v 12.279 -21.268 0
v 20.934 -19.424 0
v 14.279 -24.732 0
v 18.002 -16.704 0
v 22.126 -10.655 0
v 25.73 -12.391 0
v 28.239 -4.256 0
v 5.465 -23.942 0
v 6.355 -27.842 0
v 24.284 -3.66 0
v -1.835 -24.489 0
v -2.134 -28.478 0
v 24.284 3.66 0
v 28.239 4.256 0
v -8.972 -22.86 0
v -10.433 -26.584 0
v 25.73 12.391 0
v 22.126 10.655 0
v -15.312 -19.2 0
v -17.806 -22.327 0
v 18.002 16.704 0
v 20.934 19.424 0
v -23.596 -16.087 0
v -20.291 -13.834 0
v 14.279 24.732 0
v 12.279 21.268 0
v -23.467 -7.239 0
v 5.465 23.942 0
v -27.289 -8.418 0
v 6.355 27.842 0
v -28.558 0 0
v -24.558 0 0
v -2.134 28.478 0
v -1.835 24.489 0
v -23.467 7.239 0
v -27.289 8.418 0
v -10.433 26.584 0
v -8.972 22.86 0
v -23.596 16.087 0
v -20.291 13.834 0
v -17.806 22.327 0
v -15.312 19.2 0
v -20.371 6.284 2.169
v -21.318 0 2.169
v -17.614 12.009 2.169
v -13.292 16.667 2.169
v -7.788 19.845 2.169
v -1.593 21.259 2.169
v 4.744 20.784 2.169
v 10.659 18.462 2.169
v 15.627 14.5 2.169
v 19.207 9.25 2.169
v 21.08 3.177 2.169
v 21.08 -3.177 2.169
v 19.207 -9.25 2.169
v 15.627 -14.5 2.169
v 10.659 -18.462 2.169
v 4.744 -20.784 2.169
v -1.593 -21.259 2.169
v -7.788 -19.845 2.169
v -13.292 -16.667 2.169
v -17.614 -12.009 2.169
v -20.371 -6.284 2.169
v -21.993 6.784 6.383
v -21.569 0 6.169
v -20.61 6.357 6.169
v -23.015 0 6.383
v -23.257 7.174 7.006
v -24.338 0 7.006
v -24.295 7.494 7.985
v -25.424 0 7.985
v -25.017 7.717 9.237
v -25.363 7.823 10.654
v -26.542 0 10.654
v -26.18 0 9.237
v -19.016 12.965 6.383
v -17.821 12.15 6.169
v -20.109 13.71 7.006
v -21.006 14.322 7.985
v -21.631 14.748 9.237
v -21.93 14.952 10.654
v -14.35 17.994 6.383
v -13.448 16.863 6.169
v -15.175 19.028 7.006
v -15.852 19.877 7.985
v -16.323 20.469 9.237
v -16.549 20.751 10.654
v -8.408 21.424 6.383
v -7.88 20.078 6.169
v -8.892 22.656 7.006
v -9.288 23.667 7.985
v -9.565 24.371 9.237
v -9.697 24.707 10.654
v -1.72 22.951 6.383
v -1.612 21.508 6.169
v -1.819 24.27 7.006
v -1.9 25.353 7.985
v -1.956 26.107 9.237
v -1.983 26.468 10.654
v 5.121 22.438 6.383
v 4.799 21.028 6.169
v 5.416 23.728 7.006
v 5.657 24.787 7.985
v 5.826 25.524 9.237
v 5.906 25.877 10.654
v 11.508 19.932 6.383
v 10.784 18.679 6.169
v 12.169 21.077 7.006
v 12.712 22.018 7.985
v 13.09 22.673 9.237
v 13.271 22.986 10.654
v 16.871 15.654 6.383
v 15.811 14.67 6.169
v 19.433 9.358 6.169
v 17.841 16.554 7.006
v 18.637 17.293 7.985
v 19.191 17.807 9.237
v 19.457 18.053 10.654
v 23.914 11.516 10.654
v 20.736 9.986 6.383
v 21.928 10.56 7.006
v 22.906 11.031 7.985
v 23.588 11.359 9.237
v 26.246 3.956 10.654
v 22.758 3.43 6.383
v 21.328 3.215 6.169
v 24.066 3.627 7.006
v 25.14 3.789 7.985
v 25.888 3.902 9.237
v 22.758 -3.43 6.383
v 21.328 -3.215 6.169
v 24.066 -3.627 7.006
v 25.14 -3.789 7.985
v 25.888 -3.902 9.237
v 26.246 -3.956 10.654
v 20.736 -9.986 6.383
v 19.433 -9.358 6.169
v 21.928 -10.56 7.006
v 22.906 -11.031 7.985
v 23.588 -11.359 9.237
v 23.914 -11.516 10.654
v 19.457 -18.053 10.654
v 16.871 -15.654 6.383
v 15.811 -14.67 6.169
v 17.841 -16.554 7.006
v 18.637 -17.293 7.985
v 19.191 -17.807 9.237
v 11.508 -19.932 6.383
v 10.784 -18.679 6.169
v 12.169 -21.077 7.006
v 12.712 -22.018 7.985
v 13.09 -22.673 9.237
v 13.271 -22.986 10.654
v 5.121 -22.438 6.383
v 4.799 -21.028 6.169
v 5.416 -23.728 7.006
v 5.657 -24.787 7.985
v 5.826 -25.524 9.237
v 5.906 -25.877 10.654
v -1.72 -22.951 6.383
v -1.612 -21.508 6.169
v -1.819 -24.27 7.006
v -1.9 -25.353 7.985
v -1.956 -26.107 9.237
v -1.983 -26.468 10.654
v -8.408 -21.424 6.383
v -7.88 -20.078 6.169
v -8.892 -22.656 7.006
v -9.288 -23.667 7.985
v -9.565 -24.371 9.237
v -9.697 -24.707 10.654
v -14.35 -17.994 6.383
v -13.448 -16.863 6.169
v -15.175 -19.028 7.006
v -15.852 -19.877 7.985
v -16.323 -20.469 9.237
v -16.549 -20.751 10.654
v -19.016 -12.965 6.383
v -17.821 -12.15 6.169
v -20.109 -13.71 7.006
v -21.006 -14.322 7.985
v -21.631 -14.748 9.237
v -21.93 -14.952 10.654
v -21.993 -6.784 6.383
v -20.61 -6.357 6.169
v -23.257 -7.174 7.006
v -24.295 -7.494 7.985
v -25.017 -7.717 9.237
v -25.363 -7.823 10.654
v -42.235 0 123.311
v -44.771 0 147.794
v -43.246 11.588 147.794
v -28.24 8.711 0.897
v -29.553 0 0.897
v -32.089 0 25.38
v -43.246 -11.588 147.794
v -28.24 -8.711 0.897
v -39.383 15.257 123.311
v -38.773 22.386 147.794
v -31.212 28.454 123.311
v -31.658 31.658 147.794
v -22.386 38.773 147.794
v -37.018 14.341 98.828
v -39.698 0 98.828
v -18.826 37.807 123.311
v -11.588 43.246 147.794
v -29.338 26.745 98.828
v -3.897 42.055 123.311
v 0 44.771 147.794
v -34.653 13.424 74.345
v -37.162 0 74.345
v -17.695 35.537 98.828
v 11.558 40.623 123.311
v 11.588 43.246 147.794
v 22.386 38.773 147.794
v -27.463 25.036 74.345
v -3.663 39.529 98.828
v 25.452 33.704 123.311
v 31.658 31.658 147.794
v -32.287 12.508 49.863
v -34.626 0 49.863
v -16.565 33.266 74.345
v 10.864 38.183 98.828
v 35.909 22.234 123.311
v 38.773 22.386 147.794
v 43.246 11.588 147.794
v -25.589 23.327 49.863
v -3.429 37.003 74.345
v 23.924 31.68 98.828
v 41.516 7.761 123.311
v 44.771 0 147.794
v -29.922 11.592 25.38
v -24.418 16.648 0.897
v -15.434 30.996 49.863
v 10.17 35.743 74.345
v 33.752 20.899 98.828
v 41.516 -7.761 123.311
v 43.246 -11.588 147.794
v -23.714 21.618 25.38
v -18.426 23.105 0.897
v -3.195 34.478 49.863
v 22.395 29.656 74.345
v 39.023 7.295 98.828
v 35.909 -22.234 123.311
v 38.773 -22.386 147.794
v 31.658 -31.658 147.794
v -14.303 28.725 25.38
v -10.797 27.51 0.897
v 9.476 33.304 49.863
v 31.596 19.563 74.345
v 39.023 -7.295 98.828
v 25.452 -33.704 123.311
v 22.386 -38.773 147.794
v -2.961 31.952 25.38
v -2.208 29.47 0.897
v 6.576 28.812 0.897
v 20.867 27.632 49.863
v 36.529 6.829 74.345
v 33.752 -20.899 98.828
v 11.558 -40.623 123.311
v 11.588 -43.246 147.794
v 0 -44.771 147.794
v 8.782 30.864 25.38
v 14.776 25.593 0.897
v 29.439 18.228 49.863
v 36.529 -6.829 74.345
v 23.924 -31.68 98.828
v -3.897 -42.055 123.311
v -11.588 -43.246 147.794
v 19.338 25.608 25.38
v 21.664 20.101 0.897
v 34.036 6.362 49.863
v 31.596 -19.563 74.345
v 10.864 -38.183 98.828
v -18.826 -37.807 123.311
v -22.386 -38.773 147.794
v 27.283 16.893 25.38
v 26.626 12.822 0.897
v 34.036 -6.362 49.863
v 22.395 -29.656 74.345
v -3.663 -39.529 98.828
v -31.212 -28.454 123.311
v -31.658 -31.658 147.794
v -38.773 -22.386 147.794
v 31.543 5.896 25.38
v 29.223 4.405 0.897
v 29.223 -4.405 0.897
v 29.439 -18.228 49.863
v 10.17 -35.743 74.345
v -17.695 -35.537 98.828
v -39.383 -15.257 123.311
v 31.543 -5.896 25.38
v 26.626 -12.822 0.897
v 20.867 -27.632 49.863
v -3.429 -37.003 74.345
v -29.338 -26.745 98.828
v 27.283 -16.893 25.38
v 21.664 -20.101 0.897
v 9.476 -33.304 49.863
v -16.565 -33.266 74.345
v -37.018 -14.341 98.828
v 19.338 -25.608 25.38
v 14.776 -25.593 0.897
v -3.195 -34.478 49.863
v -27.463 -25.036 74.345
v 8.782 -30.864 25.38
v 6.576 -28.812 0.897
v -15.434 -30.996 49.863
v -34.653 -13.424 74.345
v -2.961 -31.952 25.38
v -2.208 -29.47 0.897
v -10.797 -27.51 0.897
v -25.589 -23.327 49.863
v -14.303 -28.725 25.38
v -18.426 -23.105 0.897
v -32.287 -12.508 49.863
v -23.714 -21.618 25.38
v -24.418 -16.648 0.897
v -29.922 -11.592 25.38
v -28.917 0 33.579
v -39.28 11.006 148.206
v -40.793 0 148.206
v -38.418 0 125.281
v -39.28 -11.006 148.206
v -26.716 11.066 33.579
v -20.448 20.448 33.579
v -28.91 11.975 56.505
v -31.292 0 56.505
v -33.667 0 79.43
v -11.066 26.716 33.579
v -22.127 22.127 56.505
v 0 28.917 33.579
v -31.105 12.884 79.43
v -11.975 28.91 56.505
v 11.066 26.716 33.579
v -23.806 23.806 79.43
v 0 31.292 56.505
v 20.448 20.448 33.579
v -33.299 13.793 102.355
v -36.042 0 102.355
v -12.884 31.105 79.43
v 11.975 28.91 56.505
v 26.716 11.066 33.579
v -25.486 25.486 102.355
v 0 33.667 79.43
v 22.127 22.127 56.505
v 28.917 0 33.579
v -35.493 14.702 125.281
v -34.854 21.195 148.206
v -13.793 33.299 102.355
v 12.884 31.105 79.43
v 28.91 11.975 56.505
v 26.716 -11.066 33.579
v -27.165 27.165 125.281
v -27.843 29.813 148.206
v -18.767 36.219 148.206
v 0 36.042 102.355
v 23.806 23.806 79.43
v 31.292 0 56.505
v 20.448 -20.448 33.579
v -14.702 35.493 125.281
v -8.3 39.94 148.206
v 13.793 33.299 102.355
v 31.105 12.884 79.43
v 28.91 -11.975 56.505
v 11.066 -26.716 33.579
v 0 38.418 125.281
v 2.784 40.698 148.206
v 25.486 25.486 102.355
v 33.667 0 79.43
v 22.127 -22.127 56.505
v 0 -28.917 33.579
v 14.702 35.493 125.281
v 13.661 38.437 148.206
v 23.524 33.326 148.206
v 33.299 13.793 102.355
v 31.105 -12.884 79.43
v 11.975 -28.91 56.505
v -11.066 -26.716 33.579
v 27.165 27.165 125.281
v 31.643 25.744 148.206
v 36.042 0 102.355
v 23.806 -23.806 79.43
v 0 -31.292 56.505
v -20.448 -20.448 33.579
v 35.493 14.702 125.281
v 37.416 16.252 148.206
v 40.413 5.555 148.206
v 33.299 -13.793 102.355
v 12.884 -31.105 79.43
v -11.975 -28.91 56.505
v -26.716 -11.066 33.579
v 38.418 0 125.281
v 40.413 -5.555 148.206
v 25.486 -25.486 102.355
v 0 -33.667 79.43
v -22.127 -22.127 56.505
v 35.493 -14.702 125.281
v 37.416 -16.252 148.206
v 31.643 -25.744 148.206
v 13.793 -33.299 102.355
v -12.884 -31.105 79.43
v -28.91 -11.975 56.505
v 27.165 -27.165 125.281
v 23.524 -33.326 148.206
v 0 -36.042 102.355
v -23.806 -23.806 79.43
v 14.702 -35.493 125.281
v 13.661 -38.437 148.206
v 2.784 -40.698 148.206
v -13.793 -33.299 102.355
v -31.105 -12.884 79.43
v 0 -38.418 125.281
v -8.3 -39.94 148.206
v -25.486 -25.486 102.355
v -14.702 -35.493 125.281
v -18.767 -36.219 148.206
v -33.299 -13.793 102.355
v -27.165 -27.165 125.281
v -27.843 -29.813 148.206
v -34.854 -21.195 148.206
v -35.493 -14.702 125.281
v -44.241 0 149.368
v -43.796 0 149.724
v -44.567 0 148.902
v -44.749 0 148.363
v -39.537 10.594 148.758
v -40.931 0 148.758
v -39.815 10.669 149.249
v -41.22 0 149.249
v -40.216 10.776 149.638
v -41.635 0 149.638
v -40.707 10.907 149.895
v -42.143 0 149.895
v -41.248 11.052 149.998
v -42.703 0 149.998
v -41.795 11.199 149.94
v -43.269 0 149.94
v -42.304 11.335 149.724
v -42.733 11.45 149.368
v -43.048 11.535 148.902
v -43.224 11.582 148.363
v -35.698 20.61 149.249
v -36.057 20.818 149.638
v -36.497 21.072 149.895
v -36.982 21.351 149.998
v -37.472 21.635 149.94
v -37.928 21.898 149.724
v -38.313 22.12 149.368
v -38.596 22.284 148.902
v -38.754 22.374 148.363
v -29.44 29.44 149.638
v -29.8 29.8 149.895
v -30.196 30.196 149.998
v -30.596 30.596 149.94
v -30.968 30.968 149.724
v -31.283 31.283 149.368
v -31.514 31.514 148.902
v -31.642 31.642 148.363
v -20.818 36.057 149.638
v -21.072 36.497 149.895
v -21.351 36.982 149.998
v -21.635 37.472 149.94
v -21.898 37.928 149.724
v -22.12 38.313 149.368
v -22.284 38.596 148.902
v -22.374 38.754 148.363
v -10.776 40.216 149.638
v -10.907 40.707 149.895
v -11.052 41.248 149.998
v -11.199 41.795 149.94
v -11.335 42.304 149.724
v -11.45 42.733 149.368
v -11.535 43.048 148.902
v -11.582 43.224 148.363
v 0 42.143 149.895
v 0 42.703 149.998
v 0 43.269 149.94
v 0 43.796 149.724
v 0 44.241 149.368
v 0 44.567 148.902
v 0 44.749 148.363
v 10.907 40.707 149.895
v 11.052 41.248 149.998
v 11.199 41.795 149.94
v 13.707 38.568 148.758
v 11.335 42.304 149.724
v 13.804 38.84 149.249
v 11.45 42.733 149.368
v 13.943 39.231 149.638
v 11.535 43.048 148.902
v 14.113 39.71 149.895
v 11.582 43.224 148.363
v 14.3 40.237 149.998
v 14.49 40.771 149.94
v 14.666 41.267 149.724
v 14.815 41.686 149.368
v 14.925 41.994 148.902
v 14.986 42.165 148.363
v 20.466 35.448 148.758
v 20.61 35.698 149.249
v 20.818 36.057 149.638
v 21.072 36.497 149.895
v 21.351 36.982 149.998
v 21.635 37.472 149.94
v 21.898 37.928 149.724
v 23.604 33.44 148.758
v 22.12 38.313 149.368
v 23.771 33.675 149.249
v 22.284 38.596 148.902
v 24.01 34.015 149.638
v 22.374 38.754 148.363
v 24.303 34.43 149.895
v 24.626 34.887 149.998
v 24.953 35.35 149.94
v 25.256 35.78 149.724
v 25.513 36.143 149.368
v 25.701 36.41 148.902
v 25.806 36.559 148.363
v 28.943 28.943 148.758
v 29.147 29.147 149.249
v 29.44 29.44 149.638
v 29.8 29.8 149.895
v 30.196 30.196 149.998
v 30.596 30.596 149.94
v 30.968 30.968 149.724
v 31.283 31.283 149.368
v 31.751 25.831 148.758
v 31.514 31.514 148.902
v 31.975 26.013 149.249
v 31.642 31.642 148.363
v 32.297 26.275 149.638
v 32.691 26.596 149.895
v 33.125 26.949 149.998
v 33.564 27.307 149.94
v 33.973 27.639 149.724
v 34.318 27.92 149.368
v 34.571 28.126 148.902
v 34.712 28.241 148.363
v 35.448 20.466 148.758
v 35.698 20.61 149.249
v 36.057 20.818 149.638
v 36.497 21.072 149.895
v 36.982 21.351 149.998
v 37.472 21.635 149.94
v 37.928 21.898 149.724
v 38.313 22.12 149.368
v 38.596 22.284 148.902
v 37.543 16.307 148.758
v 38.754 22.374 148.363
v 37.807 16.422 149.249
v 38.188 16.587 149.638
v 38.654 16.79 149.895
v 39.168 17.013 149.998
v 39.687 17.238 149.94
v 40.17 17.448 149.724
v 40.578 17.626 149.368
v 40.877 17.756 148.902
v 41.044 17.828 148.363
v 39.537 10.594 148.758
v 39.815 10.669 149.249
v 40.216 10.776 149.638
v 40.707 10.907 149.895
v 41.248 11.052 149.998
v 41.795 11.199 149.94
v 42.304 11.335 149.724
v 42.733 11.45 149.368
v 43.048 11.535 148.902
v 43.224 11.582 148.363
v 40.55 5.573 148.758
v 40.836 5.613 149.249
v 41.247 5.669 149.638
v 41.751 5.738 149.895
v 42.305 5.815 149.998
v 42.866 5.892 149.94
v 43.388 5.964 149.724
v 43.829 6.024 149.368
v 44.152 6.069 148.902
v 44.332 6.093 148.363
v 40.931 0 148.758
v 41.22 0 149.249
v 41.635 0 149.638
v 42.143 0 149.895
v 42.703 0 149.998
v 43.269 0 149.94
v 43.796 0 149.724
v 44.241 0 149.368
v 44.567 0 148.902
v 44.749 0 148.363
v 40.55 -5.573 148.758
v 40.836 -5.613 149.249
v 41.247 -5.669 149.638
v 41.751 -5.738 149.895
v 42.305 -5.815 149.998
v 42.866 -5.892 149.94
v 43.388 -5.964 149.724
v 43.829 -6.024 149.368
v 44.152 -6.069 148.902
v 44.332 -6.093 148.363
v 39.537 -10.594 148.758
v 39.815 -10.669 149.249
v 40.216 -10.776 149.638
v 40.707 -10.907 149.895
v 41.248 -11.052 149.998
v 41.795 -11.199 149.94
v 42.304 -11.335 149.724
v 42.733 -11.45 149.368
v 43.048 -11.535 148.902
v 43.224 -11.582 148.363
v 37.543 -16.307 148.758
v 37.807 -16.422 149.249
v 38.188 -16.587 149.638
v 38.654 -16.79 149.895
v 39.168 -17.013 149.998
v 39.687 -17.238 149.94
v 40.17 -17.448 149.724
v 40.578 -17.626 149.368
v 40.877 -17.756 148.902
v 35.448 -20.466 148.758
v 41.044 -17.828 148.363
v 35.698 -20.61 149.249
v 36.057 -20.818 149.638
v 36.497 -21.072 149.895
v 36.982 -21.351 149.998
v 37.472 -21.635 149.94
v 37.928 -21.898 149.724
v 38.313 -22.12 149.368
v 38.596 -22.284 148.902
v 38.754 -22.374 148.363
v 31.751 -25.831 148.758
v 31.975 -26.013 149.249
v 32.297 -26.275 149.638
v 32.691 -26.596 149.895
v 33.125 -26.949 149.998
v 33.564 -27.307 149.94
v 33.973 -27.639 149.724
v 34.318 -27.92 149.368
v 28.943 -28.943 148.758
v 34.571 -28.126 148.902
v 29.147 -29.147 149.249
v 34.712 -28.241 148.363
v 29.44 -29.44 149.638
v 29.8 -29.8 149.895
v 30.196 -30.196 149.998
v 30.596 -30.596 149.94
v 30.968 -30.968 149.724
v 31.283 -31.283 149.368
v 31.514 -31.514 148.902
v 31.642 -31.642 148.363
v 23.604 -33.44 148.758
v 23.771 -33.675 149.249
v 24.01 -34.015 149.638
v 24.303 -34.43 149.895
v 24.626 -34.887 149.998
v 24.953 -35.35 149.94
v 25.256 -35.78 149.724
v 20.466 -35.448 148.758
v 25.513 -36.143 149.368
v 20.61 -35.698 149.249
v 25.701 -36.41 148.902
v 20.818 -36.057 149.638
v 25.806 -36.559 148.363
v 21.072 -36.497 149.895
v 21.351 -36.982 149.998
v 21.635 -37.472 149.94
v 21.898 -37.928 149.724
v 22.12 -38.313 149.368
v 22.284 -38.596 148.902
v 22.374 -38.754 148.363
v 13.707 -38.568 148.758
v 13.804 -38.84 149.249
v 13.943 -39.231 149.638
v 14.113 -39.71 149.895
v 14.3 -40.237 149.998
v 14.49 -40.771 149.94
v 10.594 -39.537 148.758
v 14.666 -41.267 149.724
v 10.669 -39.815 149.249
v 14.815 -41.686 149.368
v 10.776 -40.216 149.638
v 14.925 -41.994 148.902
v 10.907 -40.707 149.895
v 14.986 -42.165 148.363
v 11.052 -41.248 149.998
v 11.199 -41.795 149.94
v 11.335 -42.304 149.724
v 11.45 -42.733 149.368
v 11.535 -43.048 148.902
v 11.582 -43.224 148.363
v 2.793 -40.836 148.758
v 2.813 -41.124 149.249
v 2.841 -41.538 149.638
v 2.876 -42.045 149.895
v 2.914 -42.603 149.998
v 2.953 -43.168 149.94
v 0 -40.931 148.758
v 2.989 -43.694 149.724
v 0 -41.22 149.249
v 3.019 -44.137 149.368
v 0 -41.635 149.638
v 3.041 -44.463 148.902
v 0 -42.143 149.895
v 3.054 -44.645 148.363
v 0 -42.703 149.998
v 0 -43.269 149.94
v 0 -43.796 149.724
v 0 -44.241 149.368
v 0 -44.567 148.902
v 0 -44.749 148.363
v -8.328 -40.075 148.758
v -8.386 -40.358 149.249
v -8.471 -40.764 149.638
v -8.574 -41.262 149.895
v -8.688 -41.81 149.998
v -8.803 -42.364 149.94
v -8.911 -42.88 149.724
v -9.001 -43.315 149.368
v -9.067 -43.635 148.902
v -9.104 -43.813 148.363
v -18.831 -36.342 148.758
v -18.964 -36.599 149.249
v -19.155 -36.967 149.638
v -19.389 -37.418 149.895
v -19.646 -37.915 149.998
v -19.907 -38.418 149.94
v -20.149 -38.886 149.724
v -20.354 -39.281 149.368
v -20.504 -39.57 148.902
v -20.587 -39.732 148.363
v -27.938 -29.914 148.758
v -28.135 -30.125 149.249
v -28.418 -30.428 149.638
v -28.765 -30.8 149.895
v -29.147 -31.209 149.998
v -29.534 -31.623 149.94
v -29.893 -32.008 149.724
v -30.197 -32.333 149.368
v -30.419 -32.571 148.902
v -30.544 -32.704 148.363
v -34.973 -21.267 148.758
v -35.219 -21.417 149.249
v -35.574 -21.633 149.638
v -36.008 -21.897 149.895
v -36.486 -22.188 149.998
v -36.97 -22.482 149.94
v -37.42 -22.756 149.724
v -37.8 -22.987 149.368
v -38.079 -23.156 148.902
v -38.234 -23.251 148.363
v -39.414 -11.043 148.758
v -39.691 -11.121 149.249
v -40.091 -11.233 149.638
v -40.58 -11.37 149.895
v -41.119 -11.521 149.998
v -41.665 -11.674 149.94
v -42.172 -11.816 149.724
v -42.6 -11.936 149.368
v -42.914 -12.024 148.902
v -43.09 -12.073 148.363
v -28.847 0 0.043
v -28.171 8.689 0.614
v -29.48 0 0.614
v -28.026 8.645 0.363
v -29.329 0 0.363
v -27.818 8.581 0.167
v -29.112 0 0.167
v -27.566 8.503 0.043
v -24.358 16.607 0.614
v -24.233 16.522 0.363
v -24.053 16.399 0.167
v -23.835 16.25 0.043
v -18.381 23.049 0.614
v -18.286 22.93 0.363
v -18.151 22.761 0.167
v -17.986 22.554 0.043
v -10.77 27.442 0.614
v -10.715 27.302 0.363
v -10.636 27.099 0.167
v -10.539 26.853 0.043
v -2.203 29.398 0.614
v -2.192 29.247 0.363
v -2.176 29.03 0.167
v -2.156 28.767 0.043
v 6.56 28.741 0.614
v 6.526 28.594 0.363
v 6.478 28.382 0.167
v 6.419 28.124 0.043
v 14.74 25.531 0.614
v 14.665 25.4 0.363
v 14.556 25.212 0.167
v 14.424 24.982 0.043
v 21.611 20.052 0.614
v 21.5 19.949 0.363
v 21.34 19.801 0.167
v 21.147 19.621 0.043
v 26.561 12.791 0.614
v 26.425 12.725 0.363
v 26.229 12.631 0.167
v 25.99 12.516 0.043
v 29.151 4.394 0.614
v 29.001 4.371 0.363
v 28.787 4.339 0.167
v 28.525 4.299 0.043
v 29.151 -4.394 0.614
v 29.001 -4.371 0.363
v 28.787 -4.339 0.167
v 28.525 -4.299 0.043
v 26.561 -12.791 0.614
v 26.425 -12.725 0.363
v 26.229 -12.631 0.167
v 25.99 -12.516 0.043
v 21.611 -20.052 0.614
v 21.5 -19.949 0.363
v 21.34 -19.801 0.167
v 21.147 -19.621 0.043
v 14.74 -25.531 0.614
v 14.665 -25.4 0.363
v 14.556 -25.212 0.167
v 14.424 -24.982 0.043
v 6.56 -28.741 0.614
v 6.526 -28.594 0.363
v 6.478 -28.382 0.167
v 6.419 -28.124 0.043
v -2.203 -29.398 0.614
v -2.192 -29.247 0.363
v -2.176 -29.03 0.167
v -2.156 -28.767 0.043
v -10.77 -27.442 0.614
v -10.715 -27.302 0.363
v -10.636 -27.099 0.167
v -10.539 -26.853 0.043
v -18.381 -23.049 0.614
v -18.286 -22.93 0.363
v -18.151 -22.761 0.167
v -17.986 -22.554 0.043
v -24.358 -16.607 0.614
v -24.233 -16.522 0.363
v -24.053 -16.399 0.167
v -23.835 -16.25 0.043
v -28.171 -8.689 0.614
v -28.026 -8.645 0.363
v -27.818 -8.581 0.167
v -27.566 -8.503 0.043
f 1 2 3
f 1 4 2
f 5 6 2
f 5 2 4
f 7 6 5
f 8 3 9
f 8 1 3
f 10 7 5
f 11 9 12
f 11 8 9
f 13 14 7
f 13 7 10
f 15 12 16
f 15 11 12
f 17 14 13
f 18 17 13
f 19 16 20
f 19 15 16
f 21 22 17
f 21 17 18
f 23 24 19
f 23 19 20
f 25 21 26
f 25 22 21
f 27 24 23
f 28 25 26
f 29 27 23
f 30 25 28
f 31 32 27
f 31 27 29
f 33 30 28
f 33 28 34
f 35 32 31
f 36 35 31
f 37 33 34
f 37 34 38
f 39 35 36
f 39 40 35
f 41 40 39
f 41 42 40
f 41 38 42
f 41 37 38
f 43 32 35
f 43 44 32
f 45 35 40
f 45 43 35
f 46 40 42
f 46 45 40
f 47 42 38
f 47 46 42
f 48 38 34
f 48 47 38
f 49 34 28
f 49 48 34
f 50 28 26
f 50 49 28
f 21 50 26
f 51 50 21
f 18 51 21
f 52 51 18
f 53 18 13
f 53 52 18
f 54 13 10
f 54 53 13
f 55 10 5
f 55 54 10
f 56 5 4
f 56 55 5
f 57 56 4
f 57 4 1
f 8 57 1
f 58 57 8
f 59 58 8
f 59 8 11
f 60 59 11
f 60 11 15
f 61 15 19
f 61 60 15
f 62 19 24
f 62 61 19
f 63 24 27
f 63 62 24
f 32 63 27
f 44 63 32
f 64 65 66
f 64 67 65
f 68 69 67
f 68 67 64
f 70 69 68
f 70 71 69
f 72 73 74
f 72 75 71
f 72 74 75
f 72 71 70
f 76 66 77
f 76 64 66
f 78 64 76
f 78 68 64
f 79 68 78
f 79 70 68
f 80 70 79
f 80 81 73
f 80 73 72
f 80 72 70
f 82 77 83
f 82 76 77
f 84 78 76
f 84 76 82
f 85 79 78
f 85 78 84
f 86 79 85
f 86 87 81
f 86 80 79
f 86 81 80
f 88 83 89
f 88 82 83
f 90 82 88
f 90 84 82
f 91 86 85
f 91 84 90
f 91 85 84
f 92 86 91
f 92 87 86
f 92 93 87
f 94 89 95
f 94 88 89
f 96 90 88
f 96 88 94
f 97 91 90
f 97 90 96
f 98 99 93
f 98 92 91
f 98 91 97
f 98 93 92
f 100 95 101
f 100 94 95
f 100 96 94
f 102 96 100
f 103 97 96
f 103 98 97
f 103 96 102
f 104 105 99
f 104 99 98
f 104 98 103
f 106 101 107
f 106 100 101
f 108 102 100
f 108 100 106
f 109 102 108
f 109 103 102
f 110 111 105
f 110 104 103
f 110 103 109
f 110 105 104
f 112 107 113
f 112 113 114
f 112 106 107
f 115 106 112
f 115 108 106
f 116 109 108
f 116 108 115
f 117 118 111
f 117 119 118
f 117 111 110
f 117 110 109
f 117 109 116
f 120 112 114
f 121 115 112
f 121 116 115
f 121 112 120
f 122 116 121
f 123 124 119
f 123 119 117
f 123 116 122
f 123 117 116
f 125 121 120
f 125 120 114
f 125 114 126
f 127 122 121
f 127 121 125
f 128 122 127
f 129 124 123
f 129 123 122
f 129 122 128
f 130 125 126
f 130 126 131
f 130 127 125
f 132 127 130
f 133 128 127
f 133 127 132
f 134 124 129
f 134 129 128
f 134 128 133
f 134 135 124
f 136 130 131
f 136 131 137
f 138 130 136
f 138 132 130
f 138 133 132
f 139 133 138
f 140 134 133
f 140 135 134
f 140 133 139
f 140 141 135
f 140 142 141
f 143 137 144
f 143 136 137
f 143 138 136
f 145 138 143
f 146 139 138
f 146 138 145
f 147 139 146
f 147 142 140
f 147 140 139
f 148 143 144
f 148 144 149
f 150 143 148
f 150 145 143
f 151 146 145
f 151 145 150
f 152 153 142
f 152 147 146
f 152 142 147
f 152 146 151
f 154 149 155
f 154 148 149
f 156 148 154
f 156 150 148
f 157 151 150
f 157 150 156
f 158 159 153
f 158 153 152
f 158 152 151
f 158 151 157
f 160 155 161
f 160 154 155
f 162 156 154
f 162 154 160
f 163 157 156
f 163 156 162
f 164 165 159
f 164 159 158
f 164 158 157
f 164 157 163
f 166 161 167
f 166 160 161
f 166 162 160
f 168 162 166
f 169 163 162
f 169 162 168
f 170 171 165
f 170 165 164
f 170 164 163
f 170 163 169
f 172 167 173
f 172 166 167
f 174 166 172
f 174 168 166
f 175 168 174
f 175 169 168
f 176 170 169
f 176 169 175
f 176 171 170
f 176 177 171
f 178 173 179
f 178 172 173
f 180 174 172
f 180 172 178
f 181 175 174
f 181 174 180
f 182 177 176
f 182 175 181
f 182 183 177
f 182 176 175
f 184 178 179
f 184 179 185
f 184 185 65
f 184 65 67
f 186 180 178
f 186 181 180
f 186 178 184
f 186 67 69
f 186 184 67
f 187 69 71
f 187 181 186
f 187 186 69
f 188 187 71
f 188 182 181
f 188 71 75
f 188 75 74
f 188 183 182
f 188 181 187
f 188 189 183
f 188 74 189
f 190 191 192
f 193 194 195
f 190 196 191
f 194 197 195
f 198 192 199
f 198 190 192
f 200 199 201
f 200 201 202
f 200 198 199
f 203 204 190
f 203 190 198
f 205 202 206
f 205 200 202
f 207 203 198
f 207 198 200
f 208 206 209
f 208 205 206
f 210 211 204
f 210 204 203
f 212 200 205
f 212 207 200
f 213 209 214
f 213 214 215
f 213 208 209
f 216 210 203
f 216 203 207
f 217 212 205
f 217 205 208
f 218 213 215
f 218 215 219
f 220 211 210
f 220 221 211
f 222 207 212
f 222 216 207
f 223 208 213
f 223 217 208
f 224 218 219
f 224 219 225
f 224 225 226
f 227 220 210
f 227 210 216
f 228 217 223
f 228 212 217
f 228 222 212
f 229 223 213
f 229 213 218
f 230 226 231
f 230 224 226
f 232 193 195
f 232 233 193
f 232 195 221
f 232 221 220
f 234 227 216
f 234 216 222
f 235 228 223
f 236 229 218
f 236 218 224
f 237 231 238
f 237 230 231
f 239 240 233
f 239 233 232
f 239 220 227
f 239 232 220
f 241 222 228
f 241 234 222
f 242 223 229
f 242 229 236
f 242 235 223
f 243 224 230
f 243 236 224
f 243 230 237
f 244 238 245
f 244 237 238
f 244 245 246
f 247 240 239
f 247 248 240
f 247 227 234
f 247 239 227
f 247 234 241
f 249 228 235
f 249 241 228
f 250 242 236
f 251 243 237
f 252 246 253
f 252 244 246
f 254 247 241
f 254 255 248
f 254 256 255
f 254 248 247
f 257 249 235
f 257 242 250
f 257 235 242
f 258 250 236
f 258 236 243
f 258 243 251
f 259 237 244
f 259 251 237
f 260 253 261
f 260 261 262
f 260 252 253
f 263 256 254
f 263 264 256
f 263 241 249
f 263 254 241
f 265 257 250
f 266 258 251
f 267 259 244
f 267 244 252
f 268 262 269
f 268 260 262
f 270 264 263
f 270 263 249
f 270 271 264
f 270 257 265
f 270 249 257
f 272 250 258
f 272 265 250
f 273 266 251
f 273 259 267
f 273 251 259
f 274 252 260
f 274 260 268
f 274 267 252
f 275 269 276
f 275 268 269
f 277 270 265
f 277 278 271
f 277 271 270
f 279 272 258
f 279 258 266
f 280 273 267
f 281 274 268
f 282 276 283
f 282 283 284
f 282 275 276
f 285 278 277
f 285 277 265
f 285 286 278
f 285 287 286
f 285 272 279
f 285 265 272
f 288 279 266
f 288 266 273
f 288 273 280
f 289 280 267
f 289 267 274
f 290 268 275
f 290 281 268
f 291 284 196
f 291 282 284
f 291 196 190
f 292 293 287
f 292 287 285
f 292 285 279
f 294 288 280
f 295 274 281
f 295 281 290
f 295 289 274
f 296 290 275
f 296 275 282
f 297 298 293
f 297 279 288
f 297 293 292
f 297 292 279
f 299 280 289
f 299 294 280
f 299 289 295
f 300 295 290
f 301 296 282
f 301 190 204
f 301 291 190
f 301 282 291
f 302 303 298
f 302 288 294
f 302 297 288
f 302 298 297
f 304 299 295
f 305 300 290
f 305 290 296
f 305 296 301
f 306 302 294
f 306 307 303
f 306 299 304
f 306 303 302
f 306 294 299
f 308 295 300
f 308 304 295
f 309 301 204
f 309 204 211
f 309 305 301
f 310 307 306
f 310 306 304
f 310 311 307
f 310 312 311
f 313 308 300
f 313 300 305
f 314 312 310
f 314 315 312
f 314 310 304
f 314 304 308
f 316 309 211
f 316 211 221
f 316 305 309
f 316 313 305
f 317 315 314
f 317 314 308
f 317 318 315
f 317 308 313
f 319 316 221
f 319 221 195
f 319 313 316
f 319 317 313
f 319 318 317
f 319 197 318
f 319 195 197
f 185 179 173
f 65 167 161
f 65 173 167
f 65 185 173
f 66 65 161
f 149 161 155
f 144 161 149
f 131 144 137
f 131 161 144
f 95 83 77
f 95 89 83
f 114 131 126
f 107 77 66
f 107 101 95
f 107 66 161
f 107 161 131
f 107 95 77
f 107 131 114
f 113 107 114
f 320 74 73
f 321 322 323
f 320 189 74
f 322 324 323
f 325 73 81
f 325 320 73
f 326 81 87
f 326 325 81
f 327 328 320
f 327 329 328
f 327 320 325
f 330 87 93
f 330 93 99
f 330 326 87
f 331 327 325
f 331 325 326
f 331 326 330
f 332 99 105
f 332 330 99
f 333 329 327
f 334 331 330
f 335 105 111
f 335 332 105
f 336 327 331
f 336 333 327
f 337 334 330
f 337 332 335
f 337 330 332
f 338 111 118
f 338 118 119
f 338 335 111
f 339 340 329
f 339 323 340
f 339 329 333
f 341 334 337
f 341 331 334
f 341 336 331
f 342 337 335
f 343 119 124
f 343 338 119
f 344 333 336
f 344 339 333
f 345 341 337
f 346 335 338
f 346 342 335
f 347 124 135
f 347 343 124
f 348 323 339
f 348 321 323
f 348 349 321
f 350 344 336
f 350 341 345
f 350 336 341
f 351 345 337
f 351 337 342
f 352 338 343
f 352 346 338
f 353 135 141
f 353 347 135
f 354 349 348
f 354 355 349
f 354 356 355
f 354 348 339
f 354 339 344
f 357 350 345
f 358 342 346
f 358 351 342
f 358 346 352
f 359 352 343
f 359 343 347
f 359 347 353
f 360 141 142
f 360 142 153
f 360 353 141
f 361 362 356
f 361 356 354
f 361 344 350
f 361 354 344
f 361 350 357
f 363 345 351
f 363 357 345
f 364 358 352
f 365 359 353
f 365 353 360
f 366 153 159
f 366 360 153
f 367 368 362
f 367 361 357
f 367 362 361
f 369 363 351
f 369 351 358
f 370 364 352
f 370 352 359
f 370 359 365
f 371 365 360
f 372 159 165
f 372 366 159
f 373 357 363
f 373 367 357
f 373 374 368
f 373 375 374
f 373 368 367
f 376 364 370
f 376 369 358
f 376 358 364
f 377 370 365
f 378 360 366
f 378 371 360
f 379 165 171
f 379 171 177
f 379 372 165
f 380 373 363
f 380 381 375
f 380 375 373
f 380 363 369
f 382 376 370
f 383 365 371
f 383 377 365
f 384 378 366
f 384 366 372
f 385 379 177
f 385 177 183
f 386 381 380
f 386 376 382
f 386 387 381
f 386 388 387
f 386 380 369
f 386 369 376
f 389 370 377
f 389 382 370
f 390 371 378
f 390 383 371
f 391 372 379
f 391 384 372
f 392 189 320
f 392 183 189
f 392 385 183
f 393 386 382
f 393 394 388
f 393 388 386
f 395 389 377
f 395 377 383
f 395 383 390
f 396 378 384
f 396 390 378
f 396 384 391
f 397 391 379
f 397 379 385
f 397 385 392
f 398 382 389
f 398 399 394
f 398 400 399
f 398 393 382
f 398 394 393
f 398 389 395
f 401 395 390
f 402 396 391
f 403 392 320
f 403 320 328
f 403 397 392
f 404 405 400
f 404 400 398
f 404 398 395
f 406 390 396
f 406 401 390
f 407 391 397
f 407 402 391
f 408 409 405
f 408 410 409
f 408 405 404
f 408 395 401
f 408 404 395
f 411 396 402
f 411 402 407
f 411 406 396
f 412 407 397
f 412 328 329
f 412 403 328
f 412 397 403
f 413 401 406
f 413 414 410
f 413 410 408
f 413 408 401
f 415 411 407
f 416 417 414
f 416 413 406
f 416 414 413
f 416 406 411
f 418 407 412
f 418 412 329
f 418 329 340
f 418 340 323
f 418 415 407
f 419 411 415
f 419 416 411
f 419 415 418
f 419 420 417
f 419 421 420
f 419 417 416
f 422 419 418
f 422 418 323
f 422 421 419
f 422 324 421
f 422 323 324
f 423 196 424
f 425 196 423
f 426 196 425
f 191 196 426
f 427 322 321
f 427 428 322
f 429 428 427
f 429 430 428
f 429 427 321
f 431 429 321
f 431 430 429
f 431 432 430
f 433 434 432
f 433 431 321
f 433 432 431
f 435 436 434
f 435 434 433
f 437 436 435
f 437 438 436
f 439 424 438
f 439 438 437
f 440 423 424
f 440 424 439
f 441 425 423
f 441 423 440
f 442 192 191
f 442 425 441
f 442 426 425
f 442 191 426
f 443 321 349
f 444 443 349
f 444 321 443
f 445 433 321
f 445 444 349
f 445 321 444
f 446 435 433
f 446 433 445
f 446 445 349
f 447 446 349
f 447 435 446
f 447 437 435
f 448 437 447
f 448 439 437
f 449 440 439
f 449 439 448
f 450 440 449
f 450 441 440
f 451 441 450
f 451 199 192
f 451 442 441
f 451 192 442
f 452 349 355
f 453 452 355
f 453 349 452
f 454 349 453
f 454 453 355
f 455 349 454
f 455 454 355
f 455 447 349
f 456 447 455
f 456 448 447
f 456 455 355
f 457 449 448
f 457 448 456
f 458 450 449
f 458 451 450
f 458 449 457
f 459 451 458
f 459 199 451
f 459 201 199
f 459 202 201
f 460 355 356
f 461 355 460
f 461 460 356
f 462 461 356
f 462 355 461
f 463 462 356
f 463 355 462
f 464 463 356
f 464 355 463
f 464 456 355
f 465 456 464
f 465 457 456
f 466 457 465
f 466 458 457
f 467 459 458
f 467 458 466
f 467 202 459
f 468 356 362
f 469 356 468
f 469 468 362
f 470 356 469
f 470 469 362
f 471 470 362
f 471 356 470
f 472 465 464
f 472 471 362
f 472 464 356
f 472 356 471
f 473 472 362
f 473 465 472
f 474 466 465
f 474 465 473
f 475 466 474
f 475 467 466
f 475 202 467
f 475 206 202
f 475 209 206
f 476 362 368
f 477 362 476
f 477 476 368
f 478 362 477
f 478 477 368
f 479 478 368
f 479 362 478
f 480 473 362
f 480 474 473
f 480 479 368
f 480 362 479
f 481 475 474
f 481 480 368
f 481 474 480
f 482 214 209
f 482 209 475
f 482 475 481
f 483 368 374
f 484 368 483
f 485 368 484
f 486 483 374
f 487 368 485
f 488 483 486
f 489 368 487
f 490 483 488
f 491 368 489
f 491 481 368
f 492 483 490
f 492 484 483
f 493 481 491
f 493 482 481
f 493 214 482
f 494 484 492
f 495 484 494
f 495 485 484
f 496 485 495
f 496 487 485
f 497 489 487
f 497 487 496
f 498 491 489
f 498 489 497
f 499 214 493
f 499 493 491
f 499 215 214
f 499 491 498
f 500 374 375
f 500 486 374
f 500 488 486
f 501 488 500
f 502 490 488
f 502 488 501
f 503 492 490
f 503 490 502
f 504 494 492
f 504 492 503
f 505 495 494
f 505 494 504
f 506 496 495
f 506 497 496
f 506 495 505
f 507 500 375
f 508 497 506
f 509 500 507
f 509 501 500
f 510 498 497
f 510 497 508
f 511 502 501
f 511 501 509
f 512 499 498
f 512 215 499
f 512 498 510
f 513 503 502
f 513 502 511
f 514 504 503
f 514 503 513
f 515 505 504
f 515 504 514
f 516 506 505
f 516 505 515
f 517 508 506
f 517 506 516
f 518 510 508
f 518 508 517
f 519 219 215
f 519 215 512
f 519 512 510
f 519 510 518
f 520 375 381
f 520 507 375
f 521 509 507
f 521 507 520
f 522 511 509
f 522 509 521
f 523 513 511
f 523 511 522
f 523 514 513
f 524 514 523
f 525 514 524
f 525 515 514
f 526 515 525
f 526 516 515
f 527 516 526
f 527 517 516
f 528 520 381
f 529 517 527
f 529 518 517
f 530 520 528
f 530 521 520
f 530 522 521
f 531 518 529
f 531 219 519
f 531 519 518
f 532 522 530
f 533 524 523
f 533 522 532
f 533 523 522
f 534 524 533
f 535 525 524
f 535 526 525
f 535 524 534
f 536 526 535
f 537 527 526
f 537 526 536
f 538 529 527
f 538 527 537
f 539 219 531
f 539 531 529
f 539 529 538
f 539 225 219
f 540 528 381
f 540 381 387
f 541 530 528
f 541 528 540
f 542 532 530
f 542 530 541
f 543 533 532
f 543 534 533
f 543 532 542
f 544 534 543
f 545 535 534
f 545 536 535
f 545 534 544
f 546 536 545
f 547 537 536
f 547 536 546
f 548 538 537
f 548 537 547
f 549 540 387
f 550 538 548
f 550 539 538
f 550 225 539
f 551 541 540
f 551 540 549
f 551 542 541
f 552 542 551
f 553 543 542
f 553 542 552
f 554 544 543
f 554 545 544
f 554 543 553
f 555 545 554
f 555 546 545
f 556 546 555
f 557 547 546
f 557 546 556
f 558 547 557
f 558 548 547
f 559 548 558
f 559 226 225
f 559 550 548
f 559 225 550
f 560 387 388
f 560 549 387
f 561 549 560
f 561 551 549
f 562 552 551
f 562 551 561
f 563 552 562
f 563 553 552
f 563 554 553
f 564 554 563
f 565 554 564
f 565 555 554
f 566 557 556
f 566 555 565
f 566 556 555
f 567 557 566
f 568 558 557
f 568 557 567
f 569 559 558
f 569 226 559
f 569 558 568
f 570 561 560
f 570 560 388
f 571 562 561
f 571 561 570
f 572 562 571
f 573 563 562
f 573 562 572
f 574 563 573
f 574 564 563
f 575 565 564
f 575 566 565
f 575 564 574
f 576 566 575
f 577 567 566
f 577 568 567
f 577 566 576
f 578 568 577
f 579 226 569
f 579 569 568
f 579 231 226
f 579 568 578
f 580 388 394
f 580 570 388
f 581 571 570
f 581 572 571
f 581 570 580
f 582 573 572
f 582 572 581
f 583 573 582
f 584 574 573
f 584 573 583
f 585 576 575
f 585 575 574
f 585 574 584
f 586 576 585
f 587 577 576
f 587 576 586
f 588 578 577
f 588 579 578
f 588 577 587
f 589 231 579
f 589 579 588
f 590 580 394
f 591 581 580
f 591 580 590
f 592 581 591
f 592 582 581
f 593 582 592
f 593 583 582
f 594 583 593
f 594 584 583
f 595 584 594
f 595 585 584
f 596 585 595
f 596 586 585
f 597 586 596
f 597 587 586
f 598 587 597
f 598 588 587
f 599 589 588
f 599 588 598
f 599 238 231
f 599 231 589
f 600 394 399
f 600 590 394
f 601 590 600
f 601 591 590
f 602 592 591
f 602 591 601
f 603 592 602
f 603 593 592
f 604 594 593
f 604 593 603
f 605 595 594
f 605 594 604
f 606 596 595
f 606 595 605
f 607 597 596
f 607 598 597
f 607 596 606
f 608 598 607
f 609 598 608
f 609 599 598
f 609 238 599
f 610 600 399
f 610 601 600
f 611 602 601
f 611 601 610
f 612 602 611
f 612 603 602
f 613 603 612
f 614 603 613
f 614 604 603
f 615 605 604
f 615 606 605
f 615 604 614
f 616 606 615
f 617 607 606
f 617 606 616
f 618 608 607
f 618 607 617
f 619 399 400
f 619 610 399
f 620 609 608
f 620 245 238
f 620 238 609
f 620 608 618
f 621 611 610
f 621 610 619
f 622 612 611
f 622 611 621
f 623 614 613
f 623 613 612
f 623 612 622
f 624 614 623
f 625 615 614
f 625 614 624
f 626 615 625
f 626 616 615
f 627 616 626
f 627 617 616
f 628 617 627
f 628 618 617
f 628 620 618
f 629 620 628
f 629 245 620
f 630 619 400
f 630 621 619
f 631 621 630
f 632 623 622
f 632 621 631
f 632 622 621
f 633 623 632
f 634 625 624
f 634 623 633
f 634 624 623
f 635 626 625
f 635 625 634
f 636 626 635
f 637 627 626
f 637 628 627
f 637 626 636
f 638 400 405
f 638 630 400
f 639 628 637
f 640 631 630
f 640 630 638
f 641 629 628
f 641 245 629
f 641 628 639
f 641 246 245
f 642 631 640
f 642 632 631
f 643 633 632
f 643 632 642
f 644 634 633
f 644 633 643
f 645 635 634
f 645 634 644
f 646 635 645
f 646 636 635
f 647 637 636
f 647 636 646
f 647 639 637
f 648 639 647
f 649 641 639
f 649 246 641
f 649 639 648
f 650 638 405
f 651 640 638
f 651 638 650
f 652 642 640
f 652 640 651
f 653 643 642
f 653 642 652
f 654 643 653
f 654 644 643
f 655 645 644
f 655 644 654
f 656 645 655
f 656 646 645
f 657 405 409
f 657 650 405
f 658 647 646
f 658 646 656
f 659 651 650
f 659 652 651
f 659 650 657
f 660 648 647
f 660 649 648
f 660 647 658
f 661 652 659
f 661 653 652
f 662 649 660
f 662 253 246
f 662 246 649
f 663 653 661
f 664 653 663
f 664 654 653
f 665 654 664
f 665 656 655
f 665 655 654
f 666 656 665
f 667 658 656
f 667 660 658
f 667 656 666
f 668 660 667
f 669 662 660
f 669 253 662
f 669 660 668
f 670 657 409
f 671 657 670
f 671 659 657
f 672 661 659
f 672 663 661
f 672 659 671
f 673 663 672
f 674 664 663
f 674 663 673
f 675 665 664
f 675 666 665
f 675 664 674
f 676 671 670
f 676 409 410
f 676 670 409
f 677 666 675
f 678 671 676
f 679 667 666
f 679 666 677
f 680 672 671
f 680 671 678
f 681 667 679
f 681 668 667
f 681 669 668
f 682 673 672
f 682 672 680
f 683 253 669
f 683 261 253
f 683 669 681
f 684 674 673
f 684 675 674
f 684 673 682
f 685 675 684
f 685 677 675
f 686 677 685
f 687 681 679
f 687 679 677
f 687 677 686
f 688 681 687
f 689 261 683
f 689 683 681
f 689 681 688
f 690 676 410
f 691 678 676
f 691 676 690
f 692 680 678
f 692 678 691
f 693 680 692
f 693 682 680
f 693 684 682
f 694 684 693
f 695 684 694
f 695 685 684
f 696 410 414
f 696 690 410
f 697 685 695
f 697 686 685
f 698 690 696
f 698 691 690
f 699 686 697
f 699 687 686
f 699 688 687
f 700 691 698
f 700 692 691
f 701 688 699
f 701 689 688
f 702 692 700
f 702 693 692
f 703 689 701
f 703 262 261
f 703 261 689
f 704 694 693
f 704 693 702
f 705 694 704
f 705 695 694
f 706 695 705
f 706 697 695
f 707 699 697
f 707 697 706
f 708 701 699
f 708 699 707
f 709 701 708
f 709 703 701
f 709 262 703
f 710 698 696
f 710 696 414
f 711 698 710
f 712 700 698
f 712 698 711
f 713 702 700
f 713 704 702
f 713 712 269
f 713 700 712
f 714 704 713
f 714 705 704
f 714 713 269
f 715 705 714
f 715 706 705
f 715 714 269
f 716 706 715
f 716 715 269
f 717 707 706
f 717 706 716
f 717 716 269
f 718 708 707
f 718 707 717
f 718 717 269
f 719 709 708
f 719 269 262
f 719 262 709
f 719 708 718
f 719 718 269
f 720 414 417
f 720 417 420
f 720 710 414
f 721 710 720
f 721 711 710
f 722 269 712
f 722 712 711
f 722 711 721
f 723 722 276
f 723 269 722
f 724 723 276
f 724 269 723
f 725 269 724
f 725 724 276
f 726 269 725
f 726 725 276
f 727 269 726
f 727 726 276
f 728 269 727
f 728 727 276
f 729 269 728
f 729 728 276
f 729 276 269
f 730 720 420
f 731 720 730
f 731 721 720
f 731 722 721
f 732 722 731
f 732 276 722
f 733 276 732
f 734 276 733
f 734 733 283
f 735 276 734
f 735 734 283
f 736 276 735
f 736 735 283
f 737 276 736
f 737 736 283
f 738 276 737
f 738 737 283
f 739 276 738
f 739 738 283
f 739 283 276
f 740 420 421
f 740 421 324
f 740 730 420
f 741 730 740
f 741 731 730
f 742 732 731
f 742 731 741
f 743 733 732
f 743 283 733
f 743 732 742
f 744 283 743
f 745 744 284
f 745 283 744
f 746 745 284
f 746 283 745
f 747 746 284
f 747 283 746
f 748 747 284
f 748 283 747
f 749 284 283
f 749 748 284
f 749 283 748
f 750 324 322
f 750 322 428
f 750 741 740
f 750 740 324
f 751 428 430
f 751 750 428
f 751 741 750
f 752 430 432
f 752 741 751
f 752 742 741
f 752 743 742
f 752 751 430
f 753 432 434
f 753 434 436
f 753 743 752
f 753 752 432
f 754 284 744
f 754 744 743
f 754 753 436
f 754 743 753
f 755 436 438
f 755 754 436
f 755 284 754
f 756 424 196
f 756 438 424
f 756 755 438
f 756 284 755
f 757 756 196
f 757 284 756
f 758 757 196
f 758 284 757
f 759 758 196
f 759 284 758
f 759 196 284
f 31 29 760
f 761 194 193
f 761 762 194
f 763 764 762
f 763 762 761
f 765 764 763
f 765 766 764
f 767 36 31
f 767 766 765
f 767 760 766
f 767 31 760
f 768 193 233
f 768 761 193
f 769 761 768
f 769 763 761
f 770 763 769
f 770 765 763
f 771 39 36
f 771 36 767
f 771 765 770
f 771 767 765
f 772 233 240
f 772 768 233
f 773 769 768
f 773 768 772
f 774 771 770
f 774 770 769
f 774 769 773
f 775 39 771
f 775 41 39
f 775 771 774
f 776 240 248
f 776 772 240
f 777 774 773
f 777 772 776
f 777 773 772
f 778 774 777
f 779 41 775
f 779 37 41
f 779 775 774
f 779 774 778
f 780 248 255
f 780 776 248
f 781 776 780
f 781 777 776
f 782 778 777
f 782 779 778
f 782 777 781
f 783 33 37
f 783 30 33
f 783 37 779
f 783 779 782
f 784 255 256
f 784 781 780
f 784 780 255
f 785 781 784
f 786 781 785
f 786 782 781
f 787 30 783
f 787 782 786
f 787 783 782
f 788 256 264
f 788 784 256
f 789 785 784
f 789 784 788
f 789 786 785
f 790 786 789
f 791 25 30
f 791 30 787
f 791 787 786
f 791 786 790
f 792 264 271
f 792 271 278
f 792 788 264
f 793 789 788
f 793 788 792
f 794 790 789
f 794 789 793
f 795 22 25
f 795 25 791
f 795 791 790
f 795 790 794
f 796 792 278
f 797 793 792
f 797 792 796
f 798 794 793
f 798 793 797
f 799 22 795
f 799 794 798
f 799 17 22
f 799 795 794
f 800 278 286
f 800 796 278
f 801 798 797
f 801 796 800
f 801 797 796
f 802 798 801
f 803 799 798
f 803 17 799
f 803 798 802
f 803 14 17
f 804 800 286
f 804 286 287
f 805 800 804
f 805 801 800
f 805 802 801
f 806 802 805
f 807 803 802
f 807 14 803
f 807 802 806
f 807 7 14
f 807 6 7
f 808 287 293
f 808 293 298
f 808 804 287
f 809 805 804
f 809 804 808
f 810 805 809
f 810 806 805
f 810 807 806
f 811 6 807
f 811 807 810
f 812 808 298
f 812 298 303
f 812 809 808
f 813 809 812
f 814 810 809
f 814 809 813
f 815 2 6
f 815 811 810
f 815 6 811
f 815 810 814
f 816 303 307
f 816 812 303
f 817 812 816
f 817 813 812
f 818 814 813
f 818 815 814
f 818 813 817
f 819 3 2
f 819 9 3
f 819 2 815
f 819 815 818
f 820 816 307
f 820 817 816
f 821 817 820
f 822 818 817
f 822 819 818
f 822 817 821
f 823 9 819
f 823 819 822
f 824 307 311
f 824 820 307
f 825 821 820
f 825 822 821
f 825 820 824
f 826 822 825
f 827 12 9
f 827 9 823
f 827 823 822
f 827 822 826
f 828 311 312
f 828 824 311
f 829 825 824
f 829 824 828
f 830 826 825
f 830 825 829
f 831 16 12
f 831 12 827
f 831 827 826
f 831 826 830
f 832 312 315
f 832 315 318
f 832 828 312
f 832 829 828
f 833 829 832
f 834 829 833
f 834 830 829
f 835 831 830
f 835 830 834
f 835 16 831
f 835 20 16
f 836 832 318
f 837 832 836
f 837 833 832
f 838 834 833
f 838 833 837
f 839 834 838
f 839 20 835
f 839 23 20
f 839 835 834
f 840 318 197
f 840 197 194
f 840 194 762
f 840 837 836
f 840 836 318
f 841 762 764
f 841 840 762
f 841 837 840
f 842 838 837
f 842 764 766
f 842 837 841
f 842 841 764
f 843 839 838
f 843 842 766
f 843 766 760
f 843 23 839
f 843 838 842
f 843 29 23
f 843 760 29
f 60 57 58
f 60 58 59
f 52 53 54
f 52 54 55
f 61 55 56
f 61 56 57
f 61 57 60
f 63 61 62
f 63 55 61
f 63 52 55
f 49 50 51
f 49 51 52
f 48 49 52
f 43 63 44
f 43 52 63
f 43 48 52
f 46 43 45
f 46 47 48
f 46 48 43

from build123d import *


with BuildPart() as f1:
    # F0 (on Front) → F1 (revolve)
    with BuildSketch(Plane.XZ):
        with BuildLine():
            Line((0, 2.169048), (0, 6.169048))
            Line((0, 6.169048), (-21.568638, 6.169048))
            ThreePointArc((-21.568638, 6.169048), (-24.917051, 7.45581), (-26.542019, 10.653794))
            Line((-26.542019, 10.653794), (-40.792739, 148.206101))
            ThreePointArc((-40.792739, 148.206101), (-42.988192, 149.989352), (-44.771443, 147.793899))
            Line((-44.771443, 147.793899), (-29.552598, 0.896949))
            ThreePointArc((-29.552598, 0.896949), (-29.227604, 0.257352), (-28.557922, 0))
            Line((-28.557922, 0), (-24.557922, 0))
            Line((-24.557922, 0), (-21.31824, 2.169048))
            Line((-21.31824, 2.169048), (0, 2.169048))
        make_face()
    revolve(axis=Axis((0, 0, 4.169048), (0, 0, -1)))


solid = f1.part
